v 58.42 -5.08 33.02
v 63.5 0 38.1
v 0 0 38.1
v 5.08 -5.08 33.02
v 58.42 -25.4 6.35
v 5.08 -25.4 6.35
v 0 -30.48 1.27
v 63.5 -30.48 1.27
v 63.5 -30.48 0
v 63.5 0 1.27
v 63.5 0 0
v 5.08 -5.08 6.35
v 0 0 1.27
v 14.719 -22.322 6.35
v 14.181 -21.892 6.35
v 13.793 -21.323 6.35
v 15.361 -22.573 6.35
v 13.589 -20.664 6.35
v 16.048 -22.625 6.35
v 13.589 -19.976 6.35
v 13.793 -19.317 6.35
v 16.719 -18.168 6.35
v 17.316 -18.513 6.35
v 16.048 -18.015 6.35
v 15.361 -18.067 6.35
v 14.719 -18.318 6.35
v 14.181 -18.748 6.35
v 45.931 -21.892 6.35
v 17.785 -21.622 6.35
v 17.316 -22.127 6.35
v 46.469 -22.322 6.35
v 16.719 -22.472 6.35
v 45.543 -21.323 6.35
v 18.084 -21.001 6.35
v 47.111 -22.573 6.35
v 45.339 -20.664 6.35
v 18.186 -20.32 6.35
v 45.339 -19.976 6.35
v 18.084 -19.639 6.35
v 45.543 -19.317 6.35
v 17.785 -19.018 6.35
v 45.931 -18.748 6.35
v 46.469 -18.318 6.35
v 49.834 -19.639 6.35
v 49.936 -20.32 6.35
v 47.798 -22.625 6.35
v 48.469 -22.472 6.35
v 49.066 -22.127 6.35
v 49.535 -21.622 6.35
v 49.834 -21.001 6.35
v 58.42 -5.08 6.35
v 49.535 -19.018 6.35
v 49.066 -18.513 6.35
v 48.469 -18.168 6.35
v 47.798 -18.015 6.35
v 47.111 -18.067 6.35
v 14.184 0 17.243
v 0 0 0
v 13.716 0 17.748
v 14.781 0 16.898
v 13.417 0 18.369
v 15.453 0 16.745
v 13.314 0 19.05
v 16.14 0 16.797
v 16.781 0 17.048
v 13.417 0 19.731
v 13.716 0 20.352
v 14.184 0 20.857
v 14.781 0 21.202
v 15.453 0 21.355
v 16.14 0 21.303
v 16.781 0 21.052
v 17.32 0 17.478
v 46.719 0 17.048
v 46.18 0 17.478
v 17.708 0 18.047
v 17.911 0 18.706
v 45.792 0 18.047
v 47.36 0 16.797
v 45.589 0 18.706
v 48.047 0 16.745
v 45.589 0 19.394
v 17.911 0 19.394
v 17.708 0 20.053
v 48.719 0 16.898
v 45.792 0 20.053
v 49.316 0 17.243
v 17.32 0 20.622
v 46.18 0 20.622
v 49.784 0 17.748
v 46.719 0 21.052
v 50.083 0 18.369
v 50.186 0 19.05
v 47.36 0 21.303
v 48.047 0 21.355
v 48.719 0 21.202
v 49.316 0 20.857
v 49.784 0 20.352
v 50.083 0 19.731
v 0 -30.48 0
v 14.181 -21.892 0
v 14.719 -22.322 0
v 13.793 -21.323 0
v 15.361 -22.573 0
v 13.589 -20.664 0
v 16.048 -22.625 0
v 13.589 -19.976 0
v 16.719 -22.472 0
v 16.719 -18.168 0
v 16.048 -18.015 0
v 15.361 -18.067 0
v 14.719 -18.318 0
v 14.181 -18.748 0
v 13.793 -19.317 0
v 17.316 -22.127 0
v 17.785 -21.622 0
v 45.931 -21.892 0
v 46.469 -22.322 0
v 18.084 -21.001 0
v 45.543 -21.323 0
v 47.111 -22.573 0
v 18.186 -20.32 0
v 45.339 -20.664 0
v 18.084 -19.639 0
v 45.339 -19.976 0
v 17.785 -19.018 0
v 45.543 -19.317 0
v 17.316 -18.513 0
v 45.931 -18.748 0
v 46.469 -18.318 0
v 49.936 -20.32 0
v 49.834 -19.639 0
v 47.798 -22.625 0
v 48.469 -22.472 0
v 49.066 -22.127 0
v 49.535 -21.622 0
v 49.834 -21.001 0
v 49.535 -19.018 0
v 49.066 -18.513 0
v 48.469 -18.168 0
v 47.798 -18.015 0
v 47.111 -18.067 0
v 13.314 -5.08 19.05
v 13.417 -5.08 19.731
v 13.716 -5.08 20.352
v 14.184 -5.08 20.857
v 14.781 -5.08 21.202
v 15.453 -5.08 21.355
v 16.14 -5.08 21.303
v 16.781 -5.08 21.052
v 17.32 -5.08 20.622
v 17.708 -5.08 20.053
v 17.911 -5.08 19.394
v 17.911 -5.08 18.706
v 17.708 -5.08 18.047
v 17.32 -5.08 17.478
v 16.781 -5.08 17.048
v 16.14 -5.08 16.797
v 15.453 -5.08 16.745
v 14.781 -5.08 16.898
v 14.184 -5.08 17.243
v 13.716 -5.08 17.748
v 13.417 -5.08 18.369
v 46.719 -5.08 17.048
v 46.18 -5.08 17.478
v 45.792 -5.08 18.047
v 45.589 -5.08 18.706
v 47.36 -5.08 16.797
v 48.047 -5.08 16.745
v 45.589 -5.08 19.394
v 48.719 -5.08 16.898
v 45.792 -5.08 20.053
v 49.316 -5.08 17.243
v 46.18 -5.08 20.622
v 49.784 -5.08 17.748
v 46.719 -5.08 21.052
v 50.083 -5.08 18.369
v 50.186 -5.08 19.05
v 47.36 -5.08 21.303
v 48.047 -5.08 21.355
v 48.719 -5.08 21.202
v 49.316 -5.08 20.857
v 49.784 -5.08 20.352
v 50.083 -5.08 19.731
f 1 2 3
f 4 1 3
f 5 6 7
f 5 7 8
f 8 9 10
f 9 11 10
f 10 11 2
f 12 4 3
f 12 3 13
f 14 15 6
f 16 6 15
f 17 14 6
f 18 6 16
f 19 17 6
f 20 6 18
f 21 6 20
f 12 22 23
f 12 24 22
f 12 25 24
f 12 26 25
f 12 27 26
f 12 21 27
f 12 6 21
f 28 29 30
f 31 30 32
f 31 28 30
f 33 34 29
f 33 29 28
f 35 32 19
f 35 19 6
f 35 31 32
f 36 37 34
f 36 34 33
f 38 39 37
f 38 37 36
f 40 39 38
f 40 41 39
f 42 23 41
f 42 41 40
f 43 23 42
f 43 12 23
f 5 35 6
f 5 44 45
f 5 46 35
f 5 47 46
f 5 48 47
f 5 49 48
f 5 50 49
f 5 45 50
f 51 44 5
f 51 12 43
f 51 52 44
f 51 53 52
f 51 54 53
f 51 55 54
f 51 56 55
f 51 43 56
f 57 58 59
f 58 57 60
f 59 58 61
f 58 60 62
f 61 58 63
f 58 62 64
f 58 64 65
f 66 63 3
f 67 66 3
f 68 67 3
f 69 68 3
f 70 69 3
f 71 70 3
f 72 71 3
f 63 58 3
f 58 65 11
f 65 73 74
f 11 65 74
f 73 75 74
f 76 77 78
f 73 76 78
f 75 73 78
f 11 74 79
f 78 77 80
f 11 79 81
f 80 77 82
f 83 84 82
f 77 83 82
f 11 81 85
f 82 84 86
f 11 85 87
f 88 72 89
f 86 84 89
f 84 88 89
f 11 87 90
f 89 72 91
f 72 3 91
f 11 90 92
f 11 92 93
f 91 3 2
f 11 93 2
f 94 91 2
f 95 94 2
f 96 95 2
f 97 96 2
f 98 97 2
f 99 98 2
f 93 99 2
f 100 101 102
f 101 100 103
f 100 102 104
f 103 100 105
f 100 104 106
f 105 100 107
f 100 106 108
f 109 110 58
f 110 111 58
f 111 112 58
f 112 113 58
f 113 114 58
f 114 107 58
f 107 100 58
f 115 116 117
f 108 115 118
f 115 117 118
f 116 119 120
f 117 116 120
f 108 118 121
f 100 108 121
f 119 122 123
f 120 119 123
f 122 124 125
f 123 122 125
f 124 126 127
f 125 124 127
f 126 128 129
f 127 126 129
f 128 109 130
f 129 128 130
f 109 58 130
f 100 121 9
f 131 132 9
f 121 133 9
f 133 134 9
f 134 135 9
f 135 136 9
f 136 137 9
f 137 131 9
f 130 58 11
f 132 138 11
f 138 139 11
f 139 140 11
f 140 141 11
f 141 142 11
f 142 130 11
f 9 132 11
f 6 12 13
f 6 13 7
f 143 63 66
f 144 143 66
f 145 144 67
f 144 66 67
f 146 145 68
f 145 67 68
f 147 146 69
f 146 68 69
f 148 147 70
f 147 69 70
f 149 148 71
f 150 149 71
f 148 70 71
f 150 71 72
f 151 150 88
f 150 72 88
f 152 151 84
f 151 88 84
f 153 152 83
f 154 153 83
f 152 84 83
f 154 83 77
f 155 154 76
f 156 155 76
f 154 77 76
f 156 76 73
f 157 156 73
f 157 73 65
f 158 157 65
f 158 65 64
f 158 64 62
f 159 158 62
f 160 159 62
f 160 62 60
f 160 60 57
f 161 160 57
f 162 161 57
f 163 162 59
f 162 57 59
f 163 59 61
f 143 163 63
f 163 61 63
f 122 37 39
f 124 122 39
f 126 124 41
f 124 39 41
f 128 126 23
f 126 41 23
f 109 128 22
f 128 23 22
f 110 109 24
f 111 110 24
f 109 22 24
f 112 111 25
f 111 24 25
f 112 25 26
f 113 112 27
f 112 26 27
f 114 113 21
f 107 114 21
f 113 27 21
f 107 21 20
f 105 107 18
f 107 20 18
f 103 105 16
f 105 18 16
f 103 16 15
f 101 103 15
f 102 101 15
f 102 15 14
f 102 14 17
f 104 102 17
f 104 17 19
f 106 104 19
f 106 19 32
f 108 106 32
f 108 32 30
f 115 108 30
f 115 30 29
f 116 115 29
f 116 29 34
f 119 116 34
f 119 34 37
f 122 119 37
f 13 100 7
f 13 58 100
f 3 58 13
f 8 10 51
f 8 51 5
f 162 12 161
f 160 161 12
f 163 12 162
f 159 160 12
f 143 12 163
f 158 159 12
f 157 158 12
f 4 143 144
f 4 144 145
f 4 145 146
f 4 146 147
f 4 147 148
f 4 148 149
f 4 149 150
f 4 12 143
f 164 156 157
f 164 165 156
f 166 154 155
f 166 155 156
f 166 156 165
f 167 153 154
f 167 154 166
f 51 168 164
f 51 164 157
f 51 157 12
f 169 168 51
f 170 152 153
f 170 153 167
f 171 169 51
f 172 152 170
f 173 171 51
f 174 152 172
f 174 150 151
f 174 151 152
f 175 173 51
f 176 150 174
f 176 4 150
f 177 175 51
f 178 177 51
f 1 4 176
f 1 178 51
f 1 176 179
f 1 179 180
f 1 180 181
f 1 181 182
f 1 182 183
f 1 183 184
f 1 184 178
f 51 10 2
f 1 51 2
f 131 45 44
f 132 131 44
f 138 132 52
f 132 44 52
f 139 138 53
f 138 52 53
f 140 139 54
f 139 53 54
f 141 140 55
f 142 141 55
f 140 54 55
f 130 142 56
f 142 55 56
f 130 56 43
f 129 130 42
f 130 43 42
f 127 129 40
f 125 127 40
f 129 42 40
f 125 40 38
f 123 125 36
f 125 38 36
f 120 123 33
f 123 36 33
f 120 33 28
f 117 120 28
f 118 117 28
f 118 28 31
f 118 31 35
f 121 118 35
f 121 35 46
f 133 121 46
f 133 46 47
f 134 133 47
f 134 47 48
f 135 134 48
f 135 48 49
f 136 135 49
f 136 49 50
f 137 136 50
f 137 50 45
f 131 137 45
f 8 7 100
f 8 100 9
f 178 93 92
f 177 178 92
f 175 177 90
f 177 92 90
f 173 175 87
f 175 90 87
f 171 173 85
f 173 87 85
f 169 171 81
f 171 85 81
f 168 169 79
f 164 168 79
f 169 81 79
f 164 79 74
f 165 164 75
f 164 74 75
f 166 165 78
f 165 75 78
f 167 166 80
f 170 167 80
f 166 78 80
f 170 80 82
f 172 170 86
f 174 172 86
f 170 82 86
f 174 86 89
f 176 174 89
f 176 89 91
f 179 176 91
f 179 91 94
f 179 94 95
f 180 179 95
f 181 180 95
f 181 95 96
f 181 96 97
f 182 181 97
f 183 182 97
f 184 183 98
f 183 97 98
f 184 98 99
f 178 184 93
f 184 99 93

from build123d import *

# Parameters (mm, degrees)
F1_DEPTH = 5.08
F2_W     = 63.5
F2_H     = 6.35
F3_DEPTH = 25.4
F4_R     = 2.3114
F5_DEPTH = 25.4
F6_SIZE  = 5.07999


# Not quite as in the source:
# - a fillet or chamfer is up to 0.001 mm smaller than in the source, because OpenCascade refuses the exact size


with BuildPart() as f1:
    # F0 (on Front) → F1 (new body)
    with BuildSketch(Plane.XZ):
        Polygon((0, 19.05), (0, 0), (31.75, 0), (31.75, 38.1), (30.7521958955, 38.1), (0, 38.1), align=None)
        with BuildLine():
            ThreePointArc((17.9369489739, 19.05), (15.6255489739, 16.7386), (13.3141489739, 19.05))
            ThreePointArc((13.3141489739, 19.05), (15.6255489739, 21.3614), (17.9369489739, 19.05))
        make_face(mode=Mode.SUBTRACT)
        Polygon((31.75, 38.1), (31.75, 0), (63.5, 0), (63.5, 19.05), (63.5, 38.1), (32.7478041045, 38.1), align=None)
        with BuildLine():
            ThreePointArc((45.5630510261, 19.05), (47.8744510261, 21.3614), (50.1858510261, 19.05))
            ThreePointArc((50.1858510261, 19.05), (47.8744510261, 16.7386), (45.5630510261, 19.05))
        make_face(mode=Mode.SUBTRACT)
    extrude(amount=F1_DEPTH)

    # F2 (on face) → F3 (join)
    with BuildSketch(Plane.XZ.offset(5.08)):
        with Locations((31.75, 3.175)):
            Rectangle(F2_W, F2_H)
    extrude(amount=F3_DEPTH)

    # F4 (on face) → F5 (cut)
    with BuildSketch(Plane.XY.offset(6.35)):
        with Locations((15.875, -20.32)):
            Circle(F4_R)
        with Locations((47.625, -20.32)):
            Circle(F4_R)
    extrude(amount=-F5_DEPTH, mode=Mode.SUBTRACT)

    # F6 (size 5.08 in the source; OpenCascade refuses exactly that, so slightly less here)
    f6_edges = [f1.edges().sort_by_distance(p)[0] for p in [
        (31.75, -5.08, 38.1),
        (31.75, -30.48, 6.35),
        (0, -17.78, 6.35),
        (63.5, -17.78, 6.35),
        (0, -5.08, 22.225),
        (63.5, -5.08, 22.225),
    ]]
    chamfer(f6_edges, length=F6_SIZE)


solid = f1.part
